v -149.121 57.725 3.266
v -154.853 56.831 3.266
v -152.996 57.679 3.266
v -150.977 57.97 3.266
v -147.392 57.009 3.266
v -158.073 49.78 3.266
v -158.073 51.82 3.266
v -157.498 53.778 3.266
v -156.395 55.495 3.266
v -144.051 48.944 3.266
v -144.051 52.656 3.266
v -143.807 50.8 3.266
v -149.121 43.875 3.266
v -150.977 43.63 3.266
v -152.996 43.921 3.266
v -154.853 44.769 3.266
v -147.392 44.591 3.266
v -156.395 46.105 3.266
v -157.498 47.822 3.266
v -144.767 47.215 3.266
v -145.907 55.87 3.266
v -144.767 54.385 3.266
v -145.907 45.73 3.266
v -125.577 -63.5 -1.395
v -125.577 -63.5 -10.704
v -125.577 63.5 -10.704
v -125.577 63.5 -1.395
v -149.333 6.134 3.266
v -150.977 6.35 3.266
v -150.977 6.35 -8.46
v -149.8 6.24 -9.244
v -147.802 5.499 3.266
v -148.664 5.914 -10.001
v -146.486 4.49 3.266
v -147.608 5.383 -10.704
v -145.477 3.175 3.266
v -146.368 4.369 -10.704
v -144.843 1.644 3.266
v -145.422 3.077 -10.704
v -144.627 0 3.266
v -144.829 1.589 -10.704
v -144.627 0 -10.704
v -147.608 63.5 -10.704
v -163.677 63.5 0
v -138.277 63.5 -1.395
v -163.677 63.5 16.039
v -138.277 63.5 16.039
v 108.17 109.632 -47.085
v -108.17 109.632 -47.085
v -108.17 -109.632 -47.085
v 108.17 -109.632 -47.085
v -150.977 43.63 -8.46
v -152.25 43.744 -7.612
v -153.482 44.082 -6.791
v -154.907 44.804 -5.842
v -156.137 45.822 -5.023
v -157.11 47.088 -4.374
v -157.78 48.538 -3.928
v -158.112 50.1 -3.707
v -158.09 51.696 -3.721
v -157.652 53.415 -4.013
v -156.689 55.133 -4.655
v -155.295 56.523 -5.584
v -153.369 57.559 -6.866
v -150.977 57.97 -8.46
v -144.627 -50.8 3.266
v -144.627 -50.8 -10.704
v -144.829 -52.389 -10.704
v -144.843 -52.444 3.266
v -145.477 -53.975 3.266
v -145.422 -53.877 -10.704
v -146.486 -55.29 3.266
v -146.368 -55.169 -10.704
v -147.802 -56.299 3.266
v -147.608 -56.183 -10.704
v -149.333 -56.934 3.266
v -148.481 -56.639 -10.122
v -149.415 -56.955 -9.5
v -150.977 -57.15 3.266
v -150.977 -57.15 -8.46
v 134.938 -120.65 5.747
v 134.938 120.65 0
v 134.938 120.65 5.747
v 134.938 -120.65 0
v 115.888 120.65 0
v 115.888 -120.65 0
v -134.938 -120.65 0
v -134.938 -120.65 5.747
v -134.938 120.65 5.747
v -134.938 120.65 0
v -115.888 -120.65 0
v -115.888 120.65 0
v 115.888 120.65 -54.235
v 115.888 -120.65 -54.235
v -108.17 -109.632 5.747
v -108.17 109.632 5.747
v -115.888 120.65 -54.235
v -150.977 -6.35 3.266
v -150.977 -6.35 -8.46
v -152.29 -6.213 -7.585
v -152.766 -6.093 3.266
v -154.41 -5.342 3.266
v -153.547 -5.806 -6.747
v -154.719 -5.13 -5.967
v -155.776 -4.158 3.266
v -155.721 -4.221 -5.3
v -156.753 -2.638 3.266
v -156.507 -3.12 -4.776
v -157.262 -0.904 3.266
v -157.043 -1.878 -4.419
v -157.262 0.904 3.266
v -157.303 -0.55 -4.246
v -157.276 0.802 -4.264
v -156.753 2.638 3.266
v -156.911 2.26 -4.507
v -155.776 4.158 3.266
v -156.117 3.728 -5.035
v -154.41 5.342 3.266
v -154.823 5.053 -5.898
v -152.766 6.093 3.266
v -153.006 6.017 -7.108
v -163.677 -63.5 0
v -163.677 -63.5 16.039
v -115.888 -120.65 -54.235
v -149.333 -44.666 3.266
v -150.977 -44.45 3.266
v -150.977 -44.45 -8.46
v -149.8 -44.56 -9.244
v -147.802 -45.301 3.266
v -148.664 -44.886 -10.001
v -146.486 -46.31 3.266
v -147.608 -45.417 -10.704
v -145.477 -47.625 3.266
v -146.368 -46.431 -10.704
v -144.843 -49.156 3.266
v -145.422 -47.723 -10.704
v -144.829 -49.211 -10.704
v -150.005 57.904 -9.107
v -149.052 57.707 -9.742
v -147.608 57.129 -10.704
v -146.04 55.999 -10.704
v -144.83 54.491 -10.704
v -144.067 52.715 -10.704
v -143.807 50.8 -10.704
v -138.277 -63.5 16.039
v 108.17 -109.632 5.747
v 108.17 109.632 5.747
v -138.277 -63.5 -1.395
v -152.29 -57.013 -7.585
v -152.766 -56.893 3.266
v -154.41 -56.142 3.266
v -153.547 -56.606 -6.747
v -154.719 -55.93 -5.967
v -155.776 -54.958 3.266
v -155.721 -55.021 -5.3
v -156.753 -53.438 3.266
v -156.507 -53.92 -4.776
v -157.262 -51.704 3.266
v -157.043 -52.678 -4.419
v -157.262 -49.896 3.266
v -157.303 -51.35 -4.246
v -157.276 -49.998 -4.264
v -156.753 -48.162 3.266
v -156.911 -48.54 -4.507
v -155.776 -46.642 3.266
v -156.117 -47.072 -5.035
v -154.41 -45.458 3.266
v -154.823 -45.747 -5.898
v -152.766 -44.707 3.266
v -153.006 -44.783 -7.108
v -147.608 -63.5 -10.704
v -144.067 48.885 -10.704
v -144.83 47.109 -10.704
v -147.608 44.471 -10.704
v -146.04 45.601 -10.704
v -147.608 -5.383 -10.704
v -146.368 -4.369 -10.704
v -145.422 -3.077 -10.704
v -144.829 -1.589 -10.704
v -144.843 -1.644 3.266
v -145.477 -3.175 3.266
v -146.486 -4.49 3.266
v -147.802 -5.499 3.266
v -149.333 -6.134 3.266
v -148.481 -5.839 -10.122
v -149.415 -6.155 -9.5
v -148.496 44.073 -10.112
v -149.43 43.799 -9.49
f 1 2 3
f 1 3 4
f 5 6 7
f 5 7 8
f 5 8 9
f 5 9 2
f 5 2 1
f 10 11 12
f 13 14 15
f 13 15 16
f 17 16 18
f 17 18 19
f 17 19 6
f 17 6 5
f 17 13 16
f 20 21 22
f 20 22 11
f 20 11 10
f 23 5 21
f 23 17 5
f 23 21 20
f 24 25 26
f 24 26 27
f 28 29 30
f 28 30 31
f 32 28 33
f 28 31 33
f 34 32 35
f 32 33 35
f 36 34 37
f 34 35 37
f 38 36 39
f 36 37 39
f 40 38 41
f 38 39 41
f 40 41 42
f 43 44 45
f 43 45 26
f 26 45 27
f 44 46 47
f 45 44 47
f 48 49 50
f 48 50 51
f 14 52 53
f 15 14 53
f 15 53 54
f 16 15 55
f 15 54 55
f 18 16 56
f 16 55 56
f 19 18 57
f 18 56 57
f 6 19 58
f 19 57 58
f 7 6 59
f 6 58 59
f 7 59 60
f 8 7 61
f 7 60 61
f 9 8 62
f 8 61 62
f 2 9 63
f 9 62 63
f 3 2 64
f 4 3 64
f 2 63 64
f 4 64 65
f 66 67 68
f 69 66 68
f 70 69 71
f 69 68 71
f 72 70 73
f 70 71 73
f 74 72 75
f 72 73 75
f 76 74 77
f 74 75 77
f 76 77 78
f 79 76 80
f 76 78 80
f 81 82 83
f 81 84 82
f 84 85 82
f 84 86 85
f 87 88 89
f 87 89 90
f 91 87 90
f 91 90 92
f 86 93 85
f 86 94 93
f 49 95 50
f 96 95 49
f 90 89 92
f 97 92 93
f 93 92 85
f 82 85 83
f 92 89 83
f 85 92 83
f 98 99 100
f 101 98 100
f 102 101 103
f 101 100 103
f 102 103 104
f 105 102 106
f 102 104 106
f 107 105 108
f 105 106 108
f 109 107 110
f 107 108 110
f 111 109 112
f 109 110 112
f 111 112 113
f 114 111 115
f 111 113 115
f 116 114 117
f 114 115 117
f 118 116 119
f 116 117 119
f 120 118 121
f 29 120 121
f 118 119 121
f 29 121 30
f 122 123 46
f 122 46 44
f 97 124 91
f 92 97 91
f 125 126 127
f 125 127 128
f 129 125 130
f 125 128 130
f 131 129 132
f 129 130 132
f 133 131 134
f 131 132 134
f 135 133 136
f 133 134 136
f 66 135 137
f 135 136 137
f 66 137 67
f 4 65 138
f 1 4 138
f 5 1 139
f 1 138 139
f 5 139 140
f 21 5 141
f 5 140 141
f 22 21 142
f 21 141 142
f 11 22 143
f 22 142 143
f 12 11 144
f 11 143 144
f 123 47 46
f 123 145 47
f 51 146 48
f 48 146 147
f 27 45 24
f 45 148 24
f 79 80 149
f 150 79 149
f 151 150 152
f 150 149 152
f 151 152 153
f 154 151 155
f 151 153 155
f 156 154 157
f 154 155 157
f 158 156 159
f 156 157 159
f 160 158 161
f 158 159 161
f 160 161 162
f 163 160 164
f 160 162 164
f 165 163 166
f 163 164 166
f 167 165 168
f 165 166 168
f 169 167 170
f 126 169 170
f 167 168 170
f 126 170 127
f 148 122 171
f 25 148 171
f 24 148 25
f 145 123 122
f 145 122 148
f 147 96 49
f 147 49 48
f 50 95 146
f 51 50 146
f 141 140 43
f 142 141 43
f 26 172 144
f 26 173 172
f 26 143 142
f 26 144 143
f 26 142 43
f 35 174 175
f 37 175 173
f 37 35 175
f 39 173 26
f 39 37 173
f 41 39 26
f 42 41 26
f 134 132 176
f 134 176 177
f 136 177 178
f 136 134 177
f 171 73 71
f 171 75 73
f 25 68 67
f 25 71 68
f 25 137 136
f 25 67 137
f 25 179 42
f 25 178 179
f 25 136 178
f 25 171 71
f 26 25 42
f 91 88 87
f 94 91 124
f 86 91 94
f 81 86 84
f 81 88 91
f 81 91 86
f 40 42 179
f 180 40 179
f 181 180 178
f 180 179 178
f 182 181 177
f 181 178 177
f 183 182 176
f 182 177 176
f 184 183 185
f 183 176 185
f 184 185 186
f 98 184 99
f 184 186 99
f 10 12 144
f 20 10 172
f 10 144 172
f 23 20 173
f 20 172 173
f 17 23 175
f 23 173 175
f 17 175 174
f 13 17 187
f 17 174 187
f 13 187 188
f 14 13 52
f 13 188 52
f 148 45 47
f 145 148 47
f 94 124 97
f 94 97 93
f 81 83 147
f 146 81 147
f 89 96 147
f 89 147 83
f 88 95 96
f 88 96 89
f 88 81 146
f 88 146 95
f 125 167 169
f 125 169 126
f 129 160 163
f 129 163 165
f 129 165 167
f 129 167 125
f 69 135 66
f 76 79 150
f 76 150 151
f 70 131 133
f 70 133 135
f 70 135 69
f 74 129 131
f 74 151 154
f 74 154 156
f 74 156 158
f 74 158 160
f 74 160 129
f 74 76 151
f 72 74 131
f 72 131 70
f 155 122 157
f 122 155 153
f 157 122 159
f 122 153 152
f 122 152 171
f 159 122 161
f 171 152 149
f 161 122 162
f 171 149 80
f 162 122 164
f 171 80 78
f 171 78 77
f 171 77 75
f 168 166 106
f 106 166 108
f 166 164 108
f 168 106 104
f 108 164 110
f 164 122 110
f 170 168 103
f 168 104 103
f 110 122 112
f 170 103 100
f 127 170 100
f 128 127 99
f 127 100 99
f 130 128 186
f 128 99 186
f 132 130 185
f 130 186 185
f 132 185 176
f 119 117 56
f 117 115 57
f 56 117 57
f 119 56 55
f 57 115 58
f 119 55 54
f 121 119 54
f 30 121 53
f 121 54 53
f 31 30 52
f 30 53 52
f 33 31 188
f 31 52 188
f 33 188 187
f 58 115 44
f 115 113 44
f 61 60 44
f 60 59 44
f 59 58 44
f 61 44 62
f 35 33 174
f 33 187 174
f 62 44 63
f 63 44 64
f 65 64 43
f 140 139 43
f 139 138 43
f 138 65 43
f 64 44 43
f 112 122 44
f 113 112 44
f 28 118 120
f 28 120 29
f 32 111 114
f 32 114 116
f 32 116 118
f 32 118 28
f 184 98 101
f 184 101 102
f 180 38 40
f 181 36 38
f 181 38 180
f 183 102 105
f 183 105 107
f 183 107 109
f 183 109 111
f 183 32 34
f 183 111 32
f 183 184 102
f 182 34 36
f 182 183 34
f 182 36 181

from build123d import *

# Parameters (mm, degrees)
F1_W      = 12.7
F1_H      = 9.3092
F2_DEPTH  = 63.5
F0_W      = 231.775
F0_H      = 54.235168
F3_DEPTH  = 120.65
F4_W      = 216.339826
F4_H      = 219.264298
F5_DEPTH  = 52.832
F8_DEPTH  = 184.151
F10_DEPTH = 13.97


with BuildPart() as f2:
    # F1 (on Front) → F2 (new body, symmetric)
    with BuildSketch(Plane.XZ):
        Polygon((-138.27653, 16.038794), (-163.67653, 16.038794), (-163.67653, -10.703998), (-138.27653, -10.703998), (-138.27653, -1.394798), align=None)
        with Locations((-131.92653, -6.049398)):
            Rectangle(F1_W, F1_H)
    extrude(amount=F2_DEPTH, both=True)

    # F7 (on face) → F8 (cut, through all)
    with BuildSketch(Plane(origin=(0, 63.5, 0), x_dir=(-1, 0, 0), z_dir=(0, 1, 0))):
        Polygon((147.607744, -10.703998), (163.67653, -10.703998), (163.67653, 0), align=None)
    extrude(amount=-F8_DEPTH, mode=Mode.SUBTRACT)

    # F9 (on face) → F10 (cut)
    with BuildSketch(Plane(origin=(0, 0, -10.703998), x_dir=(1, 0, 0), z_dir=(0, 0, -1))):
        with BuildLine():
            ThreePointArc((-150.97653, 44.45), (-146.486402, 46.309872), (-144.62653, 50.8))
            ThreePointArc((-144.62653, 50.8), (-146.486402, 55.290128), (-150.97653, 57.15))
            Line((-150.97653, 57.15), (-150.97653, 44.45))
        make_face()
        with BuildLine():
            Line((-150.97653, 44.45), (-150.97653, 57.15))
            ThreePointArc((-150.97653, 57.15), (-157.32653, 50.8), (-150.97653, 44.45))
        make_face()
        with BuildLine():
            Line((-150.97653, -6.35), (-150.97653, 6.35))
            ThreePointArc((-150.97653, 6.35), (-157.32653, 0), (-150.97653, -6.35))
        make_face()
        with BuildLine():
            ThreePointArc((-144.62653, 0), (-146.486402, 4.490128), (-150.97653, 6.35))
            Line((-150.97653, 6.35), (-150.97653, -6.35))
            ThreePointArc((-150.97653, -6.35), (-146.486402, -4.490128), (-144.62653, 0))
        make_face()
        with BuildLine():
            Line((-150.97653, -57.969606), (-150.97653, -43.630394))
            ThreePointArc((-150.97653, -43.630394), (-158.146136, -50.8), (-150.97653, -57.969606))
        make_face()
        with BuildLine():
            ThreePointArc((-143.806924, -50.8), (-145.906853, -45.730323), (-150.97653, -43.630394))
            Line((-150.97653, -43.630394), (-150.97653, -57.969606))
            ThreePointArc((-150.97653, -57.969606), (-145.906853, -55.869677), (-143.806924, -50.8))
        make_face()
    extrude(amount=-F10_DEPTH, mode=Mode.SUBTRACT)


with BuildPart() as f3:
    # F0 (on Front) → F3 (new body, symmetric)
    with BuildSketch(Plane.XZ):
        Polygon((-115.8875, 0), (115.8875, 0), (134.9375, 0), (134.9375, 5.747169), (-134.9375, 5.747169), (-134.9375, 0), align=None)
        with Locations((0, -27.117584)):
            Rectangle(F0_W, F0_H)
    extrude(amount=F3_DEPTH, both=True)

    # F4 (on face) → F5 (cut)
    with BuildSketch(Plane.XY.offset(5.747169)):
        Rectangle(F4_W, F4_H)
    extrude(amount=-F5_DEPTH, mode=Mode.SUBTRACT)


solid = Compound([f2.part, f3.part])
